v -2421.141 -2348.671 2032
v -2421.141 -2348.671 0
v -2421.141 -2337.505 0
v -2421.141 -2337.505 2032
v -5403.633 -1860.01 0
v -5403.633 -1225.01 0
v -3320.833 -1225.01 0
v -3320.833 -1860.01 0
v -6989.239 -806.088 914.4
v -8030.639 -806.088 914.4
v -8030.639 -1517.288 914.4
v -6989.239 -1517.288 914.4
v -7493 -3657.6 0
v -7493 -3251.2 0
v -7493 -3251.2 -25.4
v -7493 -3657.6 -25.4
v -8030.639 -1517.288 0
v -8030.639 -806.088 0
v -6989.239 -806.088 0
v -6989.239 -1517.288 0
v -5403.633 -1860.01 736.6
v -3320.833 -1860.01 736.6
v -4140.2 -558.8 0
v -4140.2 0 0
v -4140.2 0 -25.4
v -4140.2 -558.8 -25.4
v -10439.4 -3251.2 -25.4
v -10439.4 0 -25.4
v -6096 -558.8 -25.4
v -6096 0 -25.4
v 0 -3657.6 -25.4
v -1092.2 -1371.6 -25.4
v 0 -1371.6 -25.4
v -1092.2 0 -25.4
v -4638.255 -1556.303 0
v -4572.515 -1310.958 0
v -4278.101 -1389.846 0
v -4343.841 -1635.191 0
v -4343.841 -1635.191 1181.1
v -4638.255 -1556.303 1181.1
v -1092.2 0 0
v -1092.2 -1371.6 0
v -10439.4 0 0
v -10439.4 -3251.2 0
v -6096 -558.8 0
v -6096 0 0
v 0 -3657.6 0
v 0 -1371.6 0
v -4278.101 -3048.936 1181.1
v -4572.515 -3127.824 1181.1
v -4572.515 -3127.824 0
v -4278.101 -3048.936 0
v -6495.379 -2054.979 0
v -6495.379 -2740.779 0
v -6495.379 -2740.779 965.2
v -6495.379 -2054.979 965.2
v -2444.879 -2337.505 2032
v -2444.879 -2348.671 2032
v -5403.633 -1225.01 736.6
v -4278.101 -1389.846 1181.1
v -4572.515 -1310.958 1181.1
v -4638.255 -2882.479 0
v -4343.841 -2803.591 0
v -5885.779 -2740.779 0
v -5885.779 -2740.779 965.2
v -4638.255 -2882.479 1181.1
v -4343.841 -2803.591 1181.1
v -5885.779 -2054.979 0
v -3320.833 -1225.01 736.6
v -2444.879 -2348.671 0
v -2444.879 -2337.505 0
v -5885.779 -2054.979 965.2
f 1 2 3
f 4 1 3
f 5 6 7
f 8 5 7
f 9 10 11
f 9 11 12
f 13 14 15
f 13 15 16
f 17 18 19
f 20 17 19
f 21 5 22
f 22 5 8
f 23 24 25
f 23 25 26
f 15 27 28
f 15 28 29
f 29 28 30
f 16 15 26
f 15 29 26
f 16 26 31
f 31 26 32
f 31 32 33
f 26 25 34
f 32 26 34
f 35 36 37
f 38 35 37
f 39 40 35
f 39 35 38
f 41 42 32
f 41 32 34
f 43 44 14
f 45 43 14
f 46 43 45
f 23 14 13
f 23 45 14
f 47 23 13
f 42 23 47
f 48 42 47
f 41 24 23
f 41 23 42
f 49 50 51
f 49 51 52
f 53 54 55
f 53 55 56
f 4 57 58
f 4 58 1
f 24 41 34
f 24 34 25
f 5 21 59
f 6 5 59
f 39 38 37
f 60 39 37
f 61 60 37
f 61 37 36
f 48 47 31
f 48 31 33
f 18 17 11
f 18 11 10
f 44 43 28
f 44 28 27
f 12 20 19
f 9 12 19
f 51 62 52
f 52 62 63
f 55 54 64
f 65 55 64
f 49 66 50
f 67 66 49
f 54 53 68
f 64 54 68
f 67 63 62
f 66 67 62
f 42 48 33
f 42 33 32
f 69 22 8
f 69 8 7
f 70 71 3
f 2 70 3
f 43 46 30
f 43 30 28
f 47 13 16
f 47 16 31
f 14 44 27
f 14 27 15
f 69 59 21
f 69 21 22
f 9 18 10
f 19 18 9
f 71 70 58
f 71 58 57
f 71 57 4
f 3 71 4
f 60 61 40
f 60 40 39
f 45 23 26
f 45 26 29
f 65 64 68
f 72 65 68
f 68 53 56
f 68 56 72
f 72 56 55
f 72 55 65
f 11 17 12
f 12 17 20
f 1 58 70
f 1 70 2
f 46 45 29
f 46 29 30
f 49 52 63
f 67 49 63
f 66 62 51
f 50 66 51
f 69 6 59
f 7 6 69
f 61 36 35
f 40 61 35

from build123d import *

# Parameters (mm, degrees)
F1_DEPTH  = 25.4
F2_W      = 2082.8
F2_H      = 635
F3_DEPTH  = 736.6
F4_W      = 1041.4
F4_H      = 711.2
F5_DEPTH  = 914.4
F6_W      = 609.6
F6_H      = 685.8
F7_DEPTH  = 965.2
F9_DEPTH  = 1181.1
F10_W     = 23.737669
F10_H     = 11.166096
F11_DEPTH = 2032


with BuildPart() as f1:
    # F0 (on Top) → F1 (new body)
    with BuildSketch(Plane.XY):
        Polygon((-1092.2, -1371.6), (-1092.2, 0), (-1233.089447, 0), (-4140.2, 0), (-4140.2, -558.8), (-6096, -558.8), (-6096, 0), (-10439.4, 0), (-10439.4, -2339.524269), (-10439.4, -3251.2), (-7493, -3251.2), (-7493, -3657.6), (0, -3657.6), (0, -1371.6), (-939.8, -1371.6), align=None)
    extrude(amount=-F1_DEPTH)


with BuildPart() as f3:
    # F2 (on Top) → F3 (new body)
    with BuildSketch(Plane.XY):
        with Locations((-4362.232924, -1542.509916)):
            Rectangle(F2_W, F2_H)
    extrude(amount=F3_DEPTH)


with BuildPart() as f5:
    # F4 (on Top) → F5 (new body)
    with BuildSketch(Plane.XY):
        with Locations((-7509.939194, -1161.688115)):
            Rectangle(F4_W, F4_H)
    extrude(amount=F5_DEPTH)


with BuildPart() as f7:
    # F6 (on Top) → F7 (new body)
    with BuildSketch(Plane.XY):
        with Locations((-6190.578938, -2397.879056)):
            Rectangle(F6_W, F6_H)
    extrude(amount=F7_DEPTH)


with BuildPart() as f9:
    # F8 (on face) → F9 (new body)
    with BuildSketch(Plane.XY):
        Polygon((-4343.840993, -2803.590988), (-4638.255185, -2882.479033), (-4572.515147, -3127.824193), (-4278.100956, -3048.936148), align=None)
        Polygon((-4278.100956, -1389.845828), (-4572.515147, -1310.957783), (-4638.255185, -1556.302943), (-4343.840993, -1635.190988), align=None)
    extrude(amount=F9_DEPTH)


with BuildPart() as f11:
    # F10 (on face) → F11 (new body)
    with BuildSketch(Plane.XY):
        with Locations((-2433.009982, -2343.087673)):
            Rectangle(F10_W, F10_H)
    extrude(amount=F11_DEPTH)


solid = Compound([f1.part, f3.part, f5.part, f7.part, f9.part, f11.part])
